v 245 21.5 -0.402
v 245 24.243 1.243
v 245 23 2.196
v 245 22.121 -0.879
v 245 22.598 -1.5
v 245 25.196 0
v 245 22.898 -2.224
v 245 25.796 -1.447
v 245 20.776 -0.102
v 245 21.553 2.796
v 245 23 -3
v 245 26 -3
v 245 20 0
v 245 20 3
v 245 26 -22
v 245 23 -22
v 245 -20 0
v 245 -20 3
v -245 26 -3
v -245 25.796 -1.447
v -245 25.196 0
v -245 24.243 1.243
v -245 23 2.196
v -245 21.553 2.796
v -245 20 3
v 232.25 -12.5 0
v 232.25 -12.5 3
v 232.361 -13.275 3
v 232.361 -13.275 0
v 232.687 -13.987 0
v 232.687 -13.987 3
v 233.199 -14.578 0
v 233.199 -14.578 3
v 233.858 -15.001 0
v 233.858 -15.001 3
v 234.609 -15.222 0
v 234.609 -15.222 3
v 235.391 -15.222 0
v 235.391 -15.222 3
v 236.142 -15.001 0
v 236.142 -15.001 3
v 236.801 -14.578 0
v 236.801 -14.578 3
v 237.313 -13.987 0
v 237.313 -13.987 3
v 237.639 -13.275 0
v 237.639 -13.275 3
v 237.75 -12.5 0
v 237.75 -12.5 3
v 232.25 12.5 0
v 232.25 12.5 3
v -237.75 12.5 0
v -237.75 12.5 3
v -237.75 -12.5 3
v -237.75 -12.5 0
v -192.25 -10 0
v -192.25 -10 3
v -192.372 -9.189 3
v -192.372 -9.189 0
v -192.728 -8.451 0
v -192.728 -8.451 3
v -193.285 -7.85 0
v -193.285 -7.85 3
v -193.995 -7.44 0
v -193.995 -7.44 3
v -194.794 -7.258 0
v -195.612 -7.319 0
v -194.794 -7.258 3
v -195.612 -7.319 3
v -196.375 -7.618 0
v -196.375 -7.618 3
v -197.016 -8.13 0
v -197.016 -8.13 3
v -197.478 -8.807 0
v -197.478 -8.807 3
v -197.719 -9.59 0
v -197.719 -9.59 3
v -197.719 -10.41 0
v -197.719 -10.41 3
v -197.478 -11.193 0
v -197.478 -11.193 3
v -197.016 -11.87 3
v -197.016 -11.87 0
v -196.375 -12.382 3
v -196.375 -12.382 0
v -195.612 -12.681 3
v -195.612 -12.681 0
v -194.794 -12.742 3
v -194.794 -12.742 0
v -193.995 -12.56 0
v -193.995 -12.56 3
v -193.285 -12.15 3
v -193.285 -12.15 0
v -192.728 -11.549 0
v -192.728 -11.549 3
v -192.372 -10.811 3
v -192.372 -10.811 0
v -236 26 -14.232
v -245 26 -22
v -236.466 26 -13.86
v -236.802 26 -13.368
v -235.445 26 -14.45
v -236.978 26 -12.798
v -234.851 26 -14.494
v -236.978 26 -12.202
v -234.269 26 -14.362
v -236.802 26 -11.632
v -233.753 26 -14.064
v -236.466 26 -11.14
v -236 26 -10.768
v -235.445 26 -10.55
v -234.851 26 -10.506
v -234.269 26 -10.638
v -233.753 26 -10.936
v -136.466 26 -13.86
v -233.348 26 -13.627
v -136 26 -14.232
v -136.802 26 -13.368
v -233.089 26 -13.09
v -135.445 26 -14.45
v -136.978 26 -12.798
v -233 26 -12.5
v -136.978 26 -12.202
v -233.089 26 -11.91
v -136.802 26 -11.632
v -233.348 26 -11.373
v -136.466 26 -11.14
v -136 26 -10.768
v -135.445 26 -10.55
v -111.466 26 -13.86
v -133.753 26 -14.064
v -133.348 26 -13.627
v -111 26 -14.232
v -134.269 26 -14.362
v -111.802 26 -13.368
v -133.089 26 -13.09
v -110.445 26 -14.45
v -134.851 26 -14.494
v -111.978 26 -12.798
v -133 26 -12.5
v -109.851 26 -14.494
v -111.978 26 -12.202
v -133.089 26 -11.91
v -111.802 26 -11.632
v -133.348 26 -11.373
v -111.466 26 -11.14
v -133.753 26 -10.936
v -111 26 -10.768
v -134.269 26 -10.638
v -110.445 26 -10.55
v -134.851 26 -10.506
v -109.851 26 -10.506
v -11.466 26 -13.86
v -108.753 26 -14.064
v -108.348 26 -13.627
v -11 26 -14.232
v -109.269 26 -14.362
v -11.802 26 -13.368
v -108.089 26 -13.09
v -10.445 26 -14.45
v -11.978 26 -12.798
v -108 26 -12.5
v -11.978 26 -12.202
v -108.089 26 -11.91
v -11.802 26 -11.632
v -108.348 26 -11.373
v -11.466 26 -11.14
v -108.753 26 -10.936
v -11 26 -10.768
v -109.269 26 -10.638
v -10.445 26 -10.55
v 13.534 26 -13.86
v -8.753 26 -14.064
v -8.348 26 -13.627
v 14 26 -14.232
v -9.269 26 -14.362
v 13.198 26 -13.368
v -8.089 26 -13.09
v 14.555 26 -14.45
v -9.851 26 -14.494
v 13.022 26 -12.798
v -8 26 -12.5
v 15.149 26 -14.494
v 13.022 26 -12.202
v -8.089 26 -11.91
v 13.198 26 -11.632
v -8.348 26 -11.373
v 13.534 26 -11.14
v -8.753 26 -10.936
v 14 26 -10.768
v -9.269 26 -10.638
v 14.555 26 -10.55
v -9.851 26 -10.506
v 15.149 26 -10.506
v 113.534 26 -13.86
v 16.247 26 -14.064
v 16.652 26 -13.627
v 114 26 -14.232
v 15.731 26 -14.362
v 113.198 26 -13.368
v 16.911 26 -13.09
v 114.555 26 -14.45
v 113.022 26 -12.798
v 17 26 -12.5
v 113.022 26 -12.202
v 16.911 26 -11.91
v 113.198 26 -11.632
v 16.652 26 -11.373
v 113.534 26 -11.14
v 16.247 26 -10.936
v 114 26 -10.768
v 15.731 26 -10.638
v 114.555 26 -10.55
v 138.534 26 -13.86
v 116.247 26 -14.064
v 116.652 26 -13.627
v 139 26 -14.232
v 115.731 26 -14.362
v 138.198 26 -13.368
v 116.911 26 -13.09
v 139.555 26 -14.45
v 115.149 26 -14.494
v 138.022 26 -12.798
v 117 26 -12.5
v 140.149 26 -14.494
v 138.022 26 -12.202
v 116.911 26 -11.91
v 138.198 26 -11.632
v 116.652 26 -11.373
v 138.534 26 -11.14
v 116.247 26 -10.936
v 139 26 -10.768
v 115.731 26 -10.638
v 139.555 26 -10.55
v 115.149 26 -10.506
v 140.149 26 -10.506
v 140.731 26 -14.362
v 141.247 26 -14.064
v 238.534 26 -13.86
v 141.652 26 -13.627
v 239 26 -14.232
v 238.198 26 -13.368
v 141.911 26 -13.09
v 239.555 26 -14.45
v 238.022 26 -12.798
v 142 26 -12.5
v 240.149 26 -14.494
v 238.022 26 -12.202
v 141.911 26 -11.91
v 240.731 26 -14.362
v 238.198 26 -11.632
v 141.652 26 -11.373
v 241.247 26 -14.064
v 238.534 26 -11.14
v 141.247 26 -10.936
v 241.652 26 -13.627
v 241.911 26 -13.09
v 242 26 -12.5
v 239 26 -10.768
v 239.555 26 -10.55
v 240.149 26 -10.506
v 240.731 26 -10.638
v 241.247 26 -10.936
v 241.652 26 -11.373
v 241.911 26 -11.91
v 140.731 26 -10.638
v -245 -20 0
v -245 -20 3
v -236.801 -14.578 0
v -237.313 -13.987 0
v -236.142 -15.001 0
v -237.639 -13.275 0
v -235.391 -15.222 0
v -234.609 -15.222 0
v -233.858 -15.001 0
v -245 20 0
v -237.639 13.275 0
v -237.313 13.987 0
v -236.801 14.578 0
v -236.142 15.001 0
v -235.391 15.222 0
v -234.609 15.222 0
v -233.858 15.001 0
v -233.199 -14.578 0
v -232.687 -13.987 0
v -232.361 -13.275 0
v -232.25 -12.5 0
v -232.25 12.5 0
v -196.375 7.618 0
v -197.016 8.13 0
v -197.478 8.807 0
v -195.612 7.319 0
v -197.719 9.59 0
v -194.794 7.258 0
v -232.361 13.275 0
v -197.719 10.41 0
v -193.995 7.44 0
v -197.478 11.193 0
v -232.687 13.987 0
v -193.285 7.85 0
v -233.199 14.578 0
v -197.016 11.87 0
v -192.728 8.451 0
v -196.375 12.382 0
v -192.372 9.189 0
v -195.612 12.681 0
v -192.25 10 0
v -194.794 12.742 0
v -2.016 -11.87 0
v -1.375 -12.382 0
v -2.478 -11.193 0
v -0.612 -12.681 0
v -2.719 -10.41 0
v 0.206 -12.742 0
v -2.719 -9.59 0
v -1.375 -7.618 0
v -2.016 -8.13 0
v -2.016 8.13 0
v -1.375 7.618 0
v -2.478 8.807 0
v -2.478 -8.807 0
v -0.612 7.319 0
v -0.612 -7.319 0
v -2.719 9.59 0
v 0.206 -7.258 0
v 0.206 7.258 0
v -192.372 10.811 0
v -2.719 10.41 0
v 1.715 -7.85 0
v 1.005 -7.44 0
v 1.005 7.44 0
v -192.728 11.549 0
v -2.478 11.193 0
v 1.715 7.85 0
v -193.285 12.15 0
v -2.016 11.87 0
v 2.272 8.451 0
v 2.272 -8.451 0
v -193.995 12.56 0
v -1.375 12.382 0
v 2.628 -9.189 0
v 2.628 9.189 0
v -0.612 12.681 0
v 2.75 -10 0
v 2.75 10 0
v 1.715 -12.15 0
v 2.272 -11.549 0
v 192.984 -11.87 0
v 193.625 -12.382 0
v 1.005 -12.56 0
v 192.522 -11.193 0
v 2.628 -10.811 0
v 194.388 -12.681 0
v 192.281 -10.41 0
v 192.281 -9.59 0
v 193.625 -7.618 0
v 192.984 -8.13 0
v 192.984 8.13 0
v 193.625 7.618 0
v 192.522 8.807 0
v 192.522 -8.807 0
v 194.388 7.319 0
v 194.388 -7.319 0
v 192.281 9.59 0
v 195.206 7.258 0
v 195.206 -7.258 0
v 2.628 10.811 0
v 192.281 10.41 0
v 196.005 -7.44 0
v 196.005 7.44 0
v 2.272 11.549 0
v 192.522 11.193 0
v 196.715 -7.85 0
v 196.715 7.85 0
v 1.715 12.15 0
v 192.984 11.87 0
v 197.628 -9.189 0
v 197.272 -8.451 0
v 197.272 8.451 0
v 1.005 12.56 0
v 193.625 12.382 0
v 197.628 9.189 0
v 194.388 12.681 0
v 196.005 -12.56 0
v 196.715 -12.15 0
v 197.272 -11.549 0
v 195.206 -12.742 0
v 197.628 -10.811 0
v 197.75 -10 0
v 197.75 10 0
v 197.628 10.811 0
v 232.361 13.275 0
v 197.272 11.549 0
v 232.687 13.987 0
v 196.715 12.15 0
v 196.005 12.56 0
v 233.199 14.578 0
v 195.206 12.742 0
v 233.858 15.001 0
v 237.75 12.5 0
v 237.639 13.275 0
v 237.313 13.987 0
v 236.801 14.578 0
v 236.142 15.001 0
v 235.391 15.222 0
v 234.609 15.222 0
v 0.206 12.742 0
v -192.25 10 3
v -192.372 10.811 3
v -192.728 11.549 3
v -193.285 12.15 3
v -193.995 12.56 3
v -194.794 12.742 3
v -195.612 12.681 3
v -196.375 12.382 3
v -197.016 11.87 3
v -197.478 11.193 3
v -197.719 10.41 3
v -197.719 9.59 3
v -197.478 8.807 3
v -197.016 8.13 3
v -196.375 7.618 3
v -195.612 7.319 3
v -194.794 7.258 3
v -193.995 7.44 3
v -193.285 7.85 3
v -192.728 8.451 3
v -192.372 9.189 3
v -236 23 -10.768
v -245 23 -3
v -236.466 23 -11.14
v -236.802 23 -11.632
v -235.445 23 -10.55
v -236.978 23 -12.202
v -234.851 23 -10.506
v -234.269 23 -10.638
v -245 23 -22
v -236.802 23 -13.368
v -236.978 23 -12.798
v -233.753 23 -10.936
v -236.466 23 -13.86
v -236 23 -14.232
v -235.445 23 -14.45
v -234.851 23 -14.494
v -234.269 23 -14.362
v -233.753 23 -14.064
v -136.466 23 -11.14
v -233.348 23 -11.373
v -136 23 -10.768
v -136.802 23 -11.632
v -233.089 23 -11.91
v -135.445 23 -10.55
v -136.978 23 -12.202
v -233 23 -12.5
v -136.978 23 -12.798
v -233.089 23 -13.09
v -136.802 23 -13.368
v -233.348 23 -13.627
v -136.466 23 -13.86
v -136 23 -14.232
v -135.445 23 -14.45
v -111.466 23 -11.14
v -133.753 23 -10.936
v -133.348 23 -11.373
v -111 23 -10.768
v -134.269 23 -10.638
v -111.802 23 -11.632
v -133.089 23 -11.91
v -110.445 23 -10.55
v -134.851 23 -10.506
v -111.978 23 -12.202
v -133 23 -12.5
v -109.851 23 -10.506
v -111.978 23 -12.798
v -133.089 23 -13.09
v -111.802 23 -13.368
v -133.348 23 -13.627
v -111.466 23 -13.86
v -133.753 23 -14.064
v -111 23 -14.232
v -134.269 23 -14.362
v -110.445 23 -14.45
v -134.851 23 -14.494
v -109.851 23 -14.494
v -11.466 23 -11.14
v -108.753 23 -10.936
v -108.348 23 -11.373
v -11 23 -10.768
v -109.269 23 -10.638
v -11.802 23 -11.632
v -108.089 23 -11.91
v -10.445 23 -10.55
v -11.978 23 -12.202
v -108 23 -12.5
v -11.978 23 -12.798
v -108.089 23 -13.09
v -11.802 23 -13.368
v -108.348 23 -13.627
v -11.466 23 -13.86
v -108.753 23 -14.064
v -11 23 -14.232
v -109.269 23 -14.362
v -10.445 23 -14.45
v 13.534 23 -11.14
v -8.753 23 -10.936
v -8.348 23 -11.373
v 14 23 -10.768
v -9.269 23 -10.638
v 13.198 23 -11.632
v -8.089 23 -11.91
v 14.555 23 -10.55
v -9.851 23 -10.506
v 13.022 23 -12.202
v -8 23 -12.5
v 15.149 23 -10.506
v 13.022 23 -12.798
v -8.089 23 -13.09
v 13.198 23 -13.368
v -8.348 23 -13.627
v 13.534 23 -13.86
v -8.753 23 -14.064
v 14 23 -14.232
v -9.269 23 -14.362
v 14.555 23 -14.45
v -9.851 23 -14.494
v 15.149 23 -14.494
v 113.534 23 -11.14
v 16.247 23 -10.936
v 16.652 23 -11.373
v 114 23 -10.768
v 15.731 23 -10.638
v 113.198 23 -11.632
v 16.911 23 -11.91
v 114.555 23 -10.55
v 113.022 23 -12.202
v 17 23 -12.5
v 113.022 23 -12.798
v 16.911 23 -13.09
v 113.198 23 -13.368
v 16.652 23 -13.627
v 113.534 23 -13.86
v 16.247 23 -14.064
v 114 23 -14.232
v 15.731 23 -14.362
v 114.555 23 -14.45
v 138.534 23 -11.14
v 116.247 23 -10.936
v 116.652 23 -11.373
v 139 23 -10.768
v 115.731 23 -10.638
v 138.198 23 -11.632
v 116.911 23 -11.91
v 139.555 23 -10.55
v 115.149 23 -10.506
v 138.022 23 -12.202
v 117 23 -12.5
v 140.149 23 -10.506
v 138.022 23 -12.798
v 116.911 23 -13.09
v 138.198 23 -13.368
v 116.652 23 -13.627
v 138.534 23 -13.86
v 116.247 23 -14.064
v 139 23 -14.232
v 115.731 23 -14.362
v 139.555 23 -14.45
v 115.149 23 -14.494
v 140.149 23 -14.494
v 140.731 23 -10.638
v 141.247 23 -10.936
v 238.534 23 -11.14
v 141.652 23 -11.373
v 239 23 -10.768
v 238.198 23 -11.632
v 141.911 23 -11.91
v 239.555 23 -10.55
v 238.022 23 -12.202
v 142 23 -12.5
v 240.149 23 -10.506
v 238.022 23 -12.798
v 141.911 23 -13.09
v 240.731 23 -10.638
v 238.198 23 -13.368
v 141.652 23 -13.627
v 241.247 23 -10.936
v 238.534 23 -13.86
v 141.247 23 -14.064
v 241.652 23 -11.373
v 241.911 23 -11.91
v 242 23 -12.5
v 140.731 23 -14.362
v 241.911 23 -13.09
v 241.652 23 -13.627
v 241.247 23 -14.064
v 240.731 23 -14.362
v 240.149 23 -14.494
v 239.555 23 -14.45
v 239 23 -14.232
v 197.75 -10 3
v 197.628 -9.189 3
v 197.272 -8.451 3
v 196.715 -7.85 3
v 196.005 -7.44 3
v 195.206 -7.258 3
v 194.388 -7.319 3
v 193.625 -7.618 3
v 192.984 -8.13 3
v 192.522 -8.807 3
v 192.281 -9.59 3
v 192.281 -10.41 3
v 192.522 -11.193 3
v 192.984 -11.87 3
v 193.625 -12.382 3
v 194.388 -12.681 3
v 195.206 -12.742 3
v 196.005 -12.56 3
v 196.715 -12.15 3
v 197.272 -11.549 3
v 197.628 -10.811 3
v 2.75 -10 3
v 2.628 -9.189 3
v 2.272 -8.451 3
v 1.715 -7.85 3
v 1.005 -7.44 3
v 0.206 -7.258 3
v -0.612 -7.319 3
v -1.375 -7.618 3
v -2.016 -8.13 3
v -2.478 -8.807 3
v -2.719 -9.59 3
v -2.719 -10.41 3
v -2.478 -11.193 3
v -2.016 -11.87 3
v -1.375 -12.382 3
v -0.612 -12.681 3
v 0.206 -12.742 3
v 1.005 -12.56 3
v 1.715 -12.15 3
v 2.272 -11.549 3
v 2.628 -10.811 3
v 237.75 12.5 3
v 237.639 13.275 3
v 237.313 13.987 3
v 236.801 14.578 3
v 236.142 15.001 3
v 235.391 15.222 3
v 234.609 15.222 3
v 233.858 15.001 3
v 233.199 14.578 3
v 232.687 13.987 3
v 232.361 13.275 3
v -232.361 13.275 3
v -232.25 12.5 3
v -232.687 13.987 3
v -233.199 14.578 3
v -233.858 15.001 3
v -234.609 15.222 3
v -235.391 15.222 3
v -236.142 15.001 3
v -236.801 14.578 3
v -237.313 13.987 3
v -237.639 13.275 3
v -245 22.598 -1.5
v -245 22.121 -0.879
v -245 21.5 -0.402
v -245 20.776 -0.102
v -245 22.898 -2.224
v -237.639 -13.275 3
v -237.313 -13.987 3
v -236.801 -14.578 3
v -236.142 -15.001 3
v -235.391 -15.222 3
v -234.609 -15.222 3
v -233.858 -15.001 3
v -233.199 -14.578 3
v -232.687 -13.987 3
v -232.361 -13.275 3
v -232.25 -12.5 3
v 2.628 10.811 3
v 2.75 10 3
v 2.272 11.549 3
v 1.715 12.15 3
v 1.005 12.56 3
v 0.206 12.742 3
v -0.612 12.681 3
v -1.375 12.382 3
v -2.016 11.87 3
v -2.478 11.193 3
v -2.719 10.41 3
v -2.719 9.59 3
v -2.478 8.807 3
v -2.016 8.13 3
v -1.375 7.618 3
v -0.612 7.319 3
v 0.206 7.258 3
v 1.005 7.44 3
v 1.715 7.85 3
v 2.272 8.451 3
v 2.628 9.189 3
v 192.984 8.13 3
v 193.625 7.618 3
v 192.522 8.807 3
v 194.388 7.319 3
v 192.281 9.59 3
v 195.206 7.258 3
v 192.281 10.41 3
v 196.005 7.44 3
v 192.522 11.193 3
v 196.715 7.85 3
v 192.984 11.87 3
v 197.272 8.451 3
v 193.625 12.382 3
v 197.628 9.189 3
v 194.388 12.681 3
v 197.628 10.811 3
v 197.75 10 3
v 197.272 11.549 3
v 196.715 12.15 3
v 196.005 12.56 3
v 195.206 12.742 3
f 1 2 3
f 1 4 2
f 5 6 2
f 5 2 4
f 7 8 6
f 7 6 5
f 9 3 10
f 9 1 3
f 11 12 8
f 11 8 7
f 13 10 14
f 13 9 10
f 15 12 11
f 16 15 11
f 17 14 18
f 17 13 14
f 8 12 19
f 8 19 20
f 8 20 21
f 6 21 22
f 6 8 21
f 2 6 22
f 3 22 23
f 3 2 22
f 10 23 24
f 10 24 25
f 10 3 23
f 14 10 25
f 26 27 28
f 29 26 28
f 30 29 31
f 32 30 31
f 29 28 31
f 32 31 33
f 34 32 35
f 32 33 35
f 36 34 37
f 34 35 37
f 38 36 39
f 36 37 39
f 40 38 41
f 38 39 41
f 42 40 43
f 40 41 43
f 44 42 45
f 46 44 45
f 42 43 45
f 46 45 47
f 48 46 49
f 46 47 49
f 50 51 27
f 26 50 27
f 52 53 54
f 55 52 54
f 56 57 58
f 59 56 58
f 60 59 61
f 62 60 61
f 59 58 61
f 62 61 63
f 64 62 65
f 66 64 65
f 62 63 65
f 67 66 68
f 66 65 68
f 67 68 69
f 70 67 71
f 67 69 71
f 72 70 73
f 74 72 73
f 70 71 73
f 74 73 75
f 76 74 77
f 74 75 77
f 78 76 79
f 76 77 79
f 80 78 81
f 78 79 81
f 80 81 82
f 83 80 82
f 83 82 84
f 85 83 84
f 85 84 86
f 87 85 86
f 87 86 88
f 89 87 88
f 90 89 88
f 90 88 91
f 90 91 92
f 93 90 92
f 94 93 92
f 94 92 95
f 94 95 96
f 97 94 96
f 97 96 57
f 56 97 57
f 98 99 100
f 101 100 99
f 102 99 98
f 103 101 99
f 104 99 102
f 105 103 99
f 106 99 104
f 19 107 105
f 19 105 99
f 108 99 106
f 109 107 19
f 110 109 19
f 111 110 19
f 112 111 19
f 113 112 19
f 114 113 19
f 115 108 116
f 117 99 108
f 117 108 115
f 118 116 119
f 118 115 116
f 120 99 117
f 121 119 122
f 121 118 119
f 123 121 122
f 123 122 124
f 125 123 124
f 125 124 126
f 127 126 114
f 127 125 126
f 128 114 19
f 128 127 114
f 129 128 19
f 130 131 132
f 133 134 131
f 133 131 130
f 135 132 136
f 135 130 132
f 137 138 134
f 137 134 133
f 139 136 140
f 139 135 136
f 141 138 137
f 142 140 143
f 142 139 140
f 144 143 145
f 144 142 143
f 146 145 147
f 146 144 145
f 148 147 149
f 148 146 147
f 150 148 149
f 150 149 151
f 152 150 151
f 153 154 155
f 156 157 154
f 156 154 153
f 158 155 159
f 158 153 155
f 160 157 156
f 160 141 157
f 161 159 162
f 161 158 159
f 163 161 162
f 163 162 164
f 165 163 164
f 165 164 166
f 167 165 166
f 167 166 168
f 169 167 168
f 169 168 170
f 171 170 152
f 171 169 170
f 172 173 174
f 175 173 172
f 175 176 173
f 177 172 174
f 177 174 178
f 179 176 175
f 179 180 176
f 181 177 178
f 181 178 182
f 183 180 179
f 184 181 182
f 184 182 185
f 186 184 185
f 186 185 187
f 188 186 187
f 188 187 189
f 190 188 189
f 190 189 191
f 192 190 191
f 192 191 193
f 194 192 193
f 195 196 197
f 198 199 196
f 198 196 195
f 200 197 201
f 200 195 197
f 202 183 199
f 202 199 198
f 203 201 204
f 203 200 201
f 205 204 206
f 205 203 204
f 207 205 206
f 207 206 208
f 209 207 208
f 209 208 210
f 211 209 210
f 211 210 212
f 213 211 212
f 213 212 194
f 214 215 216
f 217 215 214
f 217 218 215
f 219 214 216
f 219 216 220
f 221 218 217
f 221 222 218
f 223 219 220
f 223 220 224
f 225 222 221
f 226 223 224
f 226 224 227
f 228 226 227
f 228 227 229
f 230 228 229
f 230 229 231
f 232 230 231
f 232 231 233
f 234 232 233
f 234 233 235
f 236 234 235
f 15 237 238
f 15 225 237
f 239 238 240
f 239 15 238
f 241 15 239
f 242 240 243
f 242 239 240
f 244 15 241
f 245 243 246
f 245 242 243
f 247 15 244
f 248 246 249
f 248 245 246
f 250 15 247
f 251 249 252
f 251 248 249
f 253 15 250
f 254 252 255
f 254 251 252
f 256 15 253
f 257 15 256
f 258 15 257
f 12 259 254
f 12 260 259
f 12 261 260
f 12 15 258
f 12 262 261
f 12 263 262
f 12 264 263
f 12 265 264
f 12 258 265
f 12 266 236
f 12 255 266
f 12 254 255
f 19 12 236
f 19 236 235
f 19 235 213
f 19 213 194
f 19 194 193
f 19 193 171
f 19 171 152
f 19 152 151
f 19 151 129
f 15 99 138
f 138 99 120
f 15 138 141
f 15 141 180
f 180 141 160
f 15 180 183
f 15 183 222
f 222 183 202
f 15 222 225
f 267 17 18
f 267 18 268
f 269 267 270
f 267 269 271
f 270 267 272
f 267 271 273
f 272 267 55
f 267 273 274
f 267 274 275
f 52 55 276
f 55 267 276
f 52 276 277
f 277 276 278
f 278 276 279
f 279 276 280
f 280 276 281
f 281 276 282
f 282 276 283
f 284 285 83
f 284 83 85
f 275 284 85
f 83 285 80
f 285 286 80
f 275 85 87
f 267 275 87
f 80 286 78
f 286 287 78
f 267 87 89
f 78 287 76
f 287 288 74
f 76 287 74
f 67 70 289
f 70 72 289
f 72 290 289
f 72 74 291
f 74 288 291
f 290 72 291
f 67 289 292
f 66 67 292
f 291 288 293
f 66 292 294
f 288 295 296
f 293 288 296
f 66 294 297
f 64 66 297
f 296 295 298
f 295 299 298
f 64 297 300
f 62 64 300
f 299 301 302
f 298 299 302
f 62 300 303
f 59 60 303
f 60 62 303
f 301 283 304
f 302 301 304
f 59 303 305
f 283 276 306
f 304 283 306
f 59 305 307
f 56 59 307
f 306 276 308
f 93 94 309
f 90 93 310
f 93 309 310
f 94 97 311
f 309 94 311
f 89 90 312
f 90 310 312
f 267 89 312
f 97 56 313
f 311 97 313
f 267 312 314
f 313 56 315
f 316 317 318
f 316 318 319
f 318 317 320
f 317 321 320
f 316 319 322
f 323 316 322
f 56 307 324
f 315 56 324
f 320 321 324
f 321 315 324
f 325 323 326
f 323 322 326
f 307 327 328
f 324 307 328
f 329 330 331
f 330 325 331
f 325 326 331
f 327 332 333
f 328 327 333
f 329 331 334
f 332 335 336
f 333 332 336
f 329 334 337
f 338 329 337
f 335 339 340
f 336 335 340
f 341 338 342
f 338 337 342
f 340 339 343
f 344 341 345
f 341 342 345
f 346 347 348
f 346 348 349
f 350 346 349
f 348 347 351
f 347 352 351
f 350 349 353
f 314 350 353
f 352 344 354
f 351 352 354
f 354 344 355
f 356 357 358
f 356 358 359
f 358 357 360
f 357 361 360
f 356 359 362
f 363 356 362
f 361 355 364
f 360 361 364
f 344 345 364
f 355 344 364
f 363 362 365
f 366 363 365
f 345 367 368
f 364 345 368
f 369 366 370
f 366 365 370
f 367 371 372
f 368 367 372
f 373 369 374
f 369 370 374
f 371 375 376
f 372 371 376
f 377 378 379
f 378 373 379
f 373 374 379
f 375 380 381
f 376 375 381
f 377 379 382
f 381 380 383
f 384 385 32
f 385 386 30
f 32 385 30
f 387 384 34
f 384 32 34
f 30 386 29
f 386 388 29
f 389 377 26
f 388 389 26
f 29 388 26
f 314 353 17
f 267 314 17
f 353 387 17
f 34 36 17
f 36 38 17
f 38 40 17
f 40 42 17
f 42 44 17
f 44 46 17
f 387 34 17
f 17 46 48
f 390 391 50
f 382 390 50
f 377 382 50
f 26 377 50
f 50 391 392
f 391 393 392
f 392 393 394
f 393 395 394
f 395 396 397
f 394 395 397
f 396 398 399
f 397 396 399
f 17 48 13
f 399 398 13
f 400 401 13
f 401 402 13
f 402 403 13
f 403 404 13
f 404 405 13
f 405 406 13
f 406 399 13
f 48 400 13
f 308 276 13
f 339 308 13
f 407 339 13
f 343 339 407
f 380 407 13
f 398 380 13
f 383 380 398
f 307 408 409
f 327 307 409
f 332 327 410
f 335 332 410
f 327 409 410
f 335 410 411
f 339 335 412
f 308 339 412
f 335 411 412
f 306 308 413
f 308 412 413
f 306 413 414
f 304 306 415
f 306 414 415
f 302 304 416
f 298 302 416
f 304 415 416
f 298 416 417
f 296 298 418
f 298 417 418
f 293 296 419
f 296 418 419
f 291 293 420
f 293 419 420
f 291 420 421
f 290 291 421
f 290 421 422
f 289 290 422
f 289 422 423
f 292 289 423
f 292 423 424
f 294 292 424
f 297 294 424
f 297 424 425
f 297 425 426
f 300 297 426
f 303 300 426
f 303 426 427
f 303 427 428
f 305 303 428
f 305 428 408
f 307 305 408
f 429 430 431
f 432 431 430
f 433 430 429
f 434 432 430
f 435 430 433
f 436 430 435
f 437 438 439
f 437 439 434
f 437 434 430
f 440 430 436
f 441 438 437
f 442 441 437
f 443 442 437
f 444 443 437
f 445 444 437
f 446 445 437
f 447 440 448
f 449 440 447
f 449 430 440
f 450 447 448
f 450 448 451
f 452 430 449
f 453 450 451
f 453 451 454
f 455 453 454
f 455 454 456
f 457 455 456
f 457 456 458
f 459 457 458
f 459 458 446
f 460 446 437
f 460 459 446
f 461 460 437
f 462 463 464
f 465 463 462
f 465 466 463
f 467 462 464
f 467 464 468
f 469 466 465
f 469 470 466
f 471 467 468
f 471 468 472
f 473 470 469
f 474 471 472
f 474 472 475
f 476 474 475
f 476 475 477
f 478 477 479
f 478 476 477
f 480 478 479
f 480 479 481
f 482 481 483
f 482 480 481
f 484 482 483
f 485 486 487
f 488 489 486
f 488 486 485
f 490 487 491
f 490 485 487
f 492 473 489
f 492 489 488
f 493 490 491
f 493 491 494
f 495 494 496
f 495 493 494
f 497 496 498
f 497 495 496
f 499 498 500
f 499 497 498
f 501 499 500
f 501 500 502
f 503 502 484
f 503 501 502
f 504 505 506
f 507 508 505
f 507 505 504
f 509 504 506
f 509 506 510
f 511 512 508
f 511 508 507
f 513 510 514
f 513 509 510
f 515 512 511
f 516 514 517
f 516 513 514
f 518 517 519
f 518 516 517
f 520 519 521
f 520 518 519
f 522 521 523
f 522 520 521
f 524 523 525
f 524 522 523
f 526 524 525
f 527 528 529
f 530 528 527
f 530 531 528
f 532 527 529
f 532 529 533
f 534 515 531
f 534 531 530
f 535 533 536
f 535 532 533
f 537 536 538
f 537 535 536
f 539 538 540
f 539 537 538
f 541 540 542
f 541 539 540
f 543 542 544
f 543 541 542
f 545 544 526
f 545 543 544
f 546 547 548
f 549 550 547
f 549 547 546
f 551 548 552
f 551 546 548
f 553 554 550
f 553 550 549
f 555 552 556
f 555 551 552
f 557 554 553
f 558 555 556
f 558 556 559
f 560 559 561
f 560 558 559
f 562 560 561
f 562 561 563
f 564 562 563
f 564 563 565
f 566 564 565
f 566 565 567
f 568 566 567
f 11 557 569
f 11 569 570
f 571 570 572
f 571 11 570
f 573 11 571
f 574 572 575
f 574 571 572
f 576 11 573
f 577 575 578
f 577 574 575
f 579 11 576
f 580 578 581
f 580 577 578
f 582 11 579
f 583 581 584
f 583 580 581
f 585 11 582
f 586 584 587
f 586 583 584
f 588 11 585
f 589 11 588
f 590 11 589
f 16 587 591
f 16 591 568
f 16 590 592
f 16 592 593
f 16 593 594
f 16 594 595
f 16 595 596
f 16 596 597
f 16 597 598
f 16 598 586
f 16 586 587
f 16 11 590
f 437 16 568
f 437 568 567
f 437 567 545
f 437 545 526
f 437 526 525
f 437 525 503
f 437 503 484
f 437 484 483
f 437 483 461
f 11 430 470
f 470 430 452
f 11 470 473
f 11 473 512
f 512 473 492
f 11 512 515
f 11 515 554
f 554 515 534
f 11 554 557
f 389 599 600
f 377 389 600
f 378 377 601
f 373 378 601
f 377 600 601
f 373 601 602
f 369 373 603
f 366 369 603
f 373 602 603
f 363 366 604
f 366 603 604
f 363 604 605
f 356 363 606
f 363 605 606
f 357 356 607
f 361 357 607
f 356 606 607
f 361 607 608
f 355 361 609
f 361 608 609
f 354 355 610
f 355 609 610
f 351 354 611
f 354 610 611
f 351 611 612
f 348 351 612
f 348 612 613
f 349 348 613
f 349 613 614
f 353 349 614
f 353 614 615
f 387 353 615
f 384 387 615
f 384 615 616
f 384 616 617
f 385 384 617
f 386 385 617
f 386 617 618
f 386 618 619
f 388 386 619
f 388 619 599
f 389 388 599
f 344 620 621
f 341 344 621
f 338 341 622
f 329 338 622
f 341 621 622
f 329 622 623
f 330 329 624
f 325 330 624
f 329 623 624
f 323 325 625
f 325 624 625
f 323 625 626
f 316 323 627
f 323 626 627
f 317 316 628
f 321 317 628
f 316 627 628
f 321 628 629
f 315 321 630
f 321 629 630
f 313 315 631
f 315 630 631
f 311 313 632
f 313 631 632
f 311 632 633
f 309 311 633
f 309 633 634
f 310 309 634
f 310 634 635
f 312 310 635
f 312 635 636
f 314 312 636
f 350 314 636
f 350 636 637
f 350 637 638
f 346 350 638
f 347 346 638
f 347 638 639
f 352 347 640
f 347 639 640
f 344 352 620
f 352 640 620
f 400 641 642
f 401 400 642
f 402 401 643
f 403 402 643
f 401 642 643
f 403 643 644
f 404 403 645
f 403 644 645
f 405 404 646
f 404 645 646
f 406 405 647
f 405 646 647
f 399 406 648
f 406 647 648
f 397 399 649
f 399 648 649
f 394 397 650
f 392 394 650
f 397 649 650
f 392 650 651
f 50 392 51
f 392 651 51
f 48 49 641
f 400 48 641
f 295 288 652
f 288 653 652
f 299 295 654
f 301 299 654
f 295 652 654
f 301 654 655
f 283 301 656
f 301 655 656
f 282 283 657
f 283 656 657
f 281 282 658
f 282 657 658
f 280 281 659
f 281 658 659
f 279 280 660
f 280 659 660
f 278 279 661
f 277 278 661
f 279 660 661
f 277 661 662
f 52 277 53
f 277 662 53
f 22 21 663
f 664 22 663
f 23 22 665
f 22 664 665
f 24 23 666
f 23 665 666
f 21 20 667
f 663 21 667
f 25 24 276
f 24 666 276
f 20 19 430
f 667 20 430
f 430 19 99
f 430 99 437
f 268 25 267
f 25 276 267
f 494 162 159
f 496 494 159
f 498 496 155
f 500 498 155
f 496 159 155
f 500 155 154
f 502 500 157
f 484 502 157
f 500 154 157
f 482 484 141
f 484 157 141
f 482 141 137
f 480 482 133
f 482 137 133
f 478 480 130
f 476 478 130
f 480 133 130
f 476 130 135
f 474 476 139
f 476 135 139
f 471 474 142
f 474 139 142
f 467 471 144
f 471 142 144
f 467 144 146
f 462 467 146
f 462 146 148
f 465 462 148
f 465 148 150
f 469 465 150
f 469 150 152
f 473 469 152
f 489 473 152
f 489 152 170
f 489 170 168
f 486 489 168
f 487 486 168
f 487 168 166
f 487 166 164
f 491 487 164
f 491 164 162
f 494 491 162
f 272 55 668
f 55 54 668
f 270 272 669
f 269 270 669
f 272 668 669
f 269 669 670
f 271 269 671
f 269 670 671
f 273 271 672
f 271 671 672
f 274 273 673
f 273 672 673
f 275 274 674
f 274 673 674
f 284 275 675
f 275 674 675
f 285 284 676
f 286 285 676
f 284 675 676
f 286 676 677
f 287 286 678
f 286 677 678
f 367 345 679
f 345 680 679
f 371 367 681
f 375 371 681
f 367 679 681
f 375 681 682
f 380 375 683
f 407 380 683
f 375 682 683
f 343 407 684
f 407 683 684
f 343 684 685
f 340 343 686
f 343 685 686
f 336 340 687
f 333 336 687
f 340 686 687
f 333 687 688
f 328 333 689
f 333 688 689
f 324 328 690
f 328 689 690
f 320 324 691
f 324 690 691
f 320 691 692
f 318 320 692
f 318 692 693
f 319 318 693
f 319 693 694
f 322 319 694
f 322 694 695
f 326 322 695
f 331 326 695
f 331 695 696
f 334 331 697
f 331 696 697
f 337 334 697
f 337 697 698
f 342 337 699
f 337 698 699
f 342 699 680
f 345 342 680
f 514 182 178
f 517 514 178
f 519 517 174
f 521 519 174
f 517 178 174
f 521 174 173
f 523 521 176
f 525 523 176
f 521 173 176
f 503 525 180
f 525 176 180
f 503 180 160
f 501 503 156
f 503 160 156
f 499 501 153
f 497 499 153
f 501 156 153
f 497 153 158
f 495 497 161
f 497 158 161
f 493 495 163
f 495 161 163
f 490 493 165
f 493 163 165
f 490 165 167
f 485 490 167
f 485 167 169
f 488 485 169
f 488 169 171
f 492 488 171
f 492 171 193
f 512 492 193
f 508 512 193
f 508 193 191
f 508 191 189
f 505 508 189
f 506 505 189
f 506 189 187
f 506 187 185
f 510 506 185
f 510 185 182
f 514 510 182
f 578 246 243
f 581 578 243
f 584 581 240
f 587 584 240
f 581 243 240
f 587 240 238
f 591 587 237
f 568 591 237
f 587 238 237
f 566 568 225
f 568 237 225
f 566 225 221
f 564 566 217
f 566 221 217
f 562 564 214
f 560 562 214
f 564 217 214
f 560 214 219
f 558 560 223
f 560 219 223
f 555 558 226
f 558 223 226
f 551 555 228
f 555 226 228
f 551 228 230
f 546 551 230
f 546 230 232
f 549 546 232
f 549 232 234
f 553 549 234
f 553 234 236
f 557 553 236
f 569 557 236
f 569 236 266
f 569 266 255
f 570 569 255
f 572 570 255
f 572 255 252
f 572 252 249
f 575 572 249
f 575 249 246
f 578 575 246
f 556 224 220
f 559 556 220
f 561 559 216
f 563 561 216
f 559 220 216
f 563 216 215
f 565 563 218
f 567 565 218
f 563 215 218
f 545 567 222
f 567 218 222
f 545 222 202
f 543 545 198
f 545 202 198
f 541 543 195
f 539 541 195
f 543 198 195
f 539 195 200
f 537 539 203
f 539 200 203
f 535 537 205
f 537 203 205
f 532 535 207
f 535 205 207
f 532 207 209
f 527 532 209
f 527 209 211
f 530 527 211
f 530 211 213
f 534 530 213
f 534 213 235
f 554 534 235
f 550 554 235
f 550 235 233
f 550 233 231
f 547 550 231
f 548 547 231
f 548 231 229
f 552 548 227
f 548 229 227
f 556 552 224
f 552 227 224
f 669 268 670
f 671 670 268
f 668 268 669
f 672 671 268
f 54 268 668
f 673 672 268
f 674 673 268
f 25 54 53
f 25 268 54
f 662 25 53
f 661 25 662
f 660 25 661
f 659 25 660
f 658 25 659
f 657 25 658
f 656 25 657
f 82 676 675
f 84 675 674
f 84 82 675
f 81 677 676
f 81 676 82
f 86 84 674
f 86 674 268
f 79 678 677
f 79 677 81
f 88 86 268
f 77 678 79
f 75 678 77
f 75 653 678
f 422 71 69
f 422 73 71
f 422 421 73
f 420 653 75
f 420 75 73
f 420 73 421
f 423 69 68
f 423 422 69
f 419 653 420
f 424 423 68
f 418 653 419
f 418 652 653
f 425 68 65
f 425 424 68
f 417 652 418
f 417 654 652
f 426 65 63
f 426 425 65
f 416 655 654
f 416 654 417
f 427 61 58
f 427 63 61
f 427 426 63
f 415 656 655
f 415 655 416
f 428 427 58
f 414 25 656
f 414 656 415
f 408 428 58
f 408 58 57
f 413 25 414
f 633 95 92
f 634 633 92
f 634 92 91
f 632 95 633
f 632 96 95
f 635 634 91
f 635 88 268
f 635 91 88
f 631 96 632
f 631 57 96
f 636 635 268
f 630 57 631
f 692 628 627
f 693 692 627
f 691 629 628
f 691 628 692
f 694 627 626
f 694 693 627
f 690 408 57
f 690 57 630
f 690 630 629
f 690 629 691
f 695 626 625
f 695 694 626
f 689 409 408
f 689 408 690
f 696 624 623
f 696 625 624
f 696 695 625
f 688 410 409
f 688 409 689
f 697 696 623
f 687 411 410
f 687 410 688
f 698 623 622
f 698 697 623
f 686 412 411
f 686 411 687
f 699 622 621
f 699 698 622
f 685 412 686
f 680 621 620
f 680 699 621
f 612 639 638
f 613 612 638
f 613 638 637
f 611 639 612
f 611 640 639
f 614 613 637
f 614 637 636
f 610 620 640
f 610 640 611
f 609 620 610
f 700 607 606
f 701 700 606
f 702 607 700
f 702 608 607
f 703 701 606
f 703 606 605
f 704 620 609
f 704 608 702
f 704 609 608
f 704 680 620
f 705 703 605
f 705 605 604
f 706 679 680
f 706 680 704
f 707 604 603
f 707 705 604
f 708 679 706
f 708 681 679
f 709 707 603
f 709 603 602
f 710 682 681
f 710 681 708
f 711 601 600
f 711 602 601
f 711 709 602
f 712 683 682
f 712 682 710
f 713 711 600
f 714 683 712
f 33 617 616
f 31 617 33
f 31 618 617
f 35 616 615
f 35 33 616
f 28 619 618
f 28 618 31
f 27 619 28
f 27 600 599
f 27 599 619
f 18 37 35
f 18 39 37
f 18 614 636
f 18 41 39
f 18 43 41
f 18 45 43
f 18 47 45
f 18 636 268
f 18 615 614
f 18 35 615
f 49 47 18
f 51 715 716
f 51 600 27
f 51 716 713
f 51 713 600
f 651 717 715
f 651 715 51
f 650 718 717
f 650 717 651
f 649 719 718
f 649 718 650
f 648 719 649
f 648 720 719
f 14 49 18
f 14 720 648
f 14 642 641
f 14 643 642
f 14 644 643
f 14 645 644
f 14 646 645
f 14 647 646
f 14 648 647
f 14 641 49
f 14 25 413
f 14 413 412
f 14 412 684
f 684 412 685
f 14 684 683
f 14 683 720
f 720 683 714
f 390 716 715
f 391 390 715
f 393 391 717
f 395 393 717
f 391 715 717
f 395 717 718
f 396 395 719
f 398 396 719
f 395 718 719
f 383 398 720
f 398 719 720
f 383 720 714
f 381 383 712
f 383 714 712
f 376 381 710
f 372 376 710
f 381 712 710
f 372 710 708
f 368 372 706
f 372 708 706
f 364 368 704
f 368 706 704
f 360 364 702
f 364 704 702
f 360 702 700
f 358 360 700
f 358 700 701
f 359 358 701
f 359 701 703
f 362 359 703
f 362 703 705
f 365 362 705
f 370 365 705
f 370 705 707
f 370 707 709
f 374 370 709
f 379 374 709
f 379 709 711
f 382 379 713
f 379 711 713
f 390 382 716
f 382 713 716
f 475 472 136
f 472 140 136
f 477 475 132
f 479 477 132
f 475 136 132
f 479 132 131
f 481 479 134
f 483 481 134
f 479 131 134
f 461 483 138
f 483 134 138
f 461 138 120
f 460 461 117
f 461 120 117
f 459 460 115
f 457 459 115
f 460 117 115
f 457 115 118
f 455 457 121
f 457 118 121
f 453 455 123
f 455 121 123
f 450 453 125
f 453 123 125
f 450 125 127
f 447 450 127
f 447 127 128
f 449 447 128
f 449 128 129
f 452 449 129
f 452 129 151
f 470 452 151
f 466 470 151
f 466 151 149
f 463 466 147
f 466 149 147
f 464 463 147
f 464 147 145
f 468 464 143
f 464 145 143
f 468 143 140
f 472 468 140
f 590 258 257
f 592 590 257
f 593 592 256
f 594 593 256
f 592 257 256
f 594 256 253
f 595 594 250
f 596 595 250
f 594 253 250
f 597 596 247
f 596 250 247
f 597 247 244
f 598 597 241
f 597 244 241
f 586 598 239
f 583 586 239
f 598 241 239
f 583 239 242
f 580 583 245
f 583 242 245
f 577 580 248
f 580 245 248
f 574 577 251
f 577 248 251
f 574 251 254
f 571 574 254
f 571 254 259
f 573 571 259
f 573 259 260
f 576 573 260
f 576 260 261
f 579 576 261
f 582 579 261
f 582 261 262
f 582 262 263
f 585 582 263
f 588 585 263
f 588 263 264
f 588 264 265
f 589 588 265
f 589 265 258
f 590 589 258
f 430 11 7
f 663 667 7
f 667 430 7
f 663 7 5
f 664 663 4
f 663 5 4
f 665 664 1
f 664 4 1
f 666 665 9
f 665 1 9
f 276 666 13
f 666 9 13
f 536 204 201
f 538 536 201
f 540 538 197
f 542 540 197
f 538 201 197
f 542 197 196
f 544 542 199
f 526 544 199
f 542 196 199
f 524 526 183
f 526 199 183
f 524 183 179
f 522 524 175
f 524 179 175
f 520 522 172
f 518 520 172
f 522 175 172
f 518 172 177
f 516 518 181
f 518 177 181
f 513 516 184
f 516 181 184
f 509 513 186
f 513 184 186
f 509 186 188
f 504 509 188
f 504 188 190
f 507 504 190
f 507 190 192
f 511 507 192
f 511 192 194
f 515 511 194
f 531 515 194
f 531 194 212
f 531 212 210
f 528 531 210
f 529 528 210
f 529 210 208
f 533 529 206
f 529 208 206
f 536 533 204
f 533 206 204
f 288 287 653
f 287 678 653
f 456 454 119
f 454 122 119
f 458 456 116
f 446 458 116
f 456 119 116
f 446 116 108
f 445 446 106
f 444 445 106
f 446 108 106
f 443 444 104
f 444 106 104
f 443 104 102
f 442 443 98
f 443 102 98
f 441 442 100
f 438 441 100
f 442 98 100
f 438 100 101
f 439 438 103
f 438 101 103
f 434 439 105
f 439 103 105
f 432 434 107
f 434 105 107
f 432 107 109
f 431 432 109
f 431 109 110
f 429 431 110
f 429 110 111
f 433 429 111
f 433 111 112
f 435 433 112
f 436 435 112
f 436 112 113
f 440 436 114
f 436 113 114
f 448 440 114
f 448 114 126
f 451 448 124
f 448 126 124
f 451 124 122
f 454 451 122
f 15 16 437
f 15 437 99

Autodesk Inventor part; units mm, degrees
ref_plane "YZ Plane" through (0, 0, 0) normal (1, 0, 0) x (0, 1, 0)
ref_plane "XZ Plane" through (0, 0, 0) normal (0, 1, 0) x (-1, 0, 0)
ref_plane "XY Plane" through (0, 0, 0) normal (0, 0, 1) x (1, 0, 0)
sketch "Sketch1" plane through (0, 0, 0) normal (0, 0, 1) x (1, 0, 0)
  line L0 (-245, 20) -> (245, 20)
  line L1 (245, 20) -> (245, -20)
  line L2 (245, -20) -> (-245, -20)
  line L3 (-245, -20) -> (-245, 20)
  point P0 (0, 0)
  dimension "d0" = 490
  dimension "d1" = 40
  dimension "d2" = 20
  dimension "d3" = 245
extrude "Plate1" add sketch "Sketch1" along normal blind 3
sketch "Sketch2" plane through (0, 0, 3) normal (0, 0, 1) x (1, 0, 0)
  line L0 (-245, 20) -> (245, 20) projected
  line L1 (-245, -20) -> (-245, 20) projected
  arc A0 (-232.25, 12.5) -> (-237.75, 12.5) centre (-235, 12.5) ccw
  arc A1 (-237.75, -12.5) -> (-232.25, -12.5) centre (-235, -12.5) ccw
  line L2 (-237.75, 12.5) -> (-237.75, -12.5)
  line L3 (-232.25, -12.5) -> (-232.25, 12.5)
  point P0 (0, 0)
  dimension "d5" = 5.5
  dimension "d6" = 5.5
  dimension "d8" = 10
  dimension "d9" = 10
  dimension "d11" = 7.5
  dimension "d27" = 25
  dimension "d28" = 25
extrude "Extrusion1" cut sketch "Sketch2" against normal blind 10
pattern_linear "Rectangular Pattern1" count 2 spacing 470 along (1, 0, 0) of "Extrusion1"
sketch "Sketch3" plane through (245, 23, -3) normal (0, 1, 0) x (-1, 0, 0)
  line L0 (490, 0) -> (0, 0)
  line L1 (0, 0) -> (0, -19)
  line L2 (0, -19) -> (490, -19)
  line L3 (490, -19) -> (490, 0)
edge flange "Flange1" height 25 angle 90 thickness 3 bend radius 3 thickness toward (0, 1, 0) relief tear relief width 3 relief depth 1.5 edges at (0, 20, 0) wall of the first edge with corners at (-245, 23, -3) (245, 23, -3) (245, 23, -22) (-245, 23, -22)
bend "Bend1"
corner "Corner1"
sketch "Sketch4" plane through (-245, 26, -22) normal (0, 1, 0) x (1, 0, 0)
  line L0 (0, 0) -> (490, 0) projected
  line L1 (0, -19) -> (0, 0) projected
  circle A0 centre (10, -9.5) radius 2
  circle A1 centre (110, -9.5) radius 2
  point P0 (245, -22)
  dimension "d29" = 4
  dimension "d30" = 9.5
  dimension "d31" = 10
  dimension "d32" = 4
  dimension "d33" = 110
  dimension "d34" = 9.5
extrude "Extrusion2" cut sketch "Sketch4" against normal through all
pattern_linear "Rectangular Pattern2" count 4 spacing 125 along (1, 0, 0) of "Extrusion2"
sketch "Sketch5" plane through (0, 0, 3) normal (0, 0, 1) x (1, 0, 0)
  line L0 (-245, 20) -> (245, 20) projected
  line L1 (-245, -20) -> (-245, 20) projected
  circle A0 centre (-195, 10) radius 2.75
  circle A1 centre (-195, -10) radius 2.75
  point P0 (0, 0)
  dimension "d40" = 5.5
  dimension "d41" = 5.5
  dimension "d42" = 20
  dimension "d43" = 10
  dimension "d44" = 50
  dimension "d45" = 50
extrude "Extrusion3" cut sketch "Sketch5" against normal through all
pattern_linear "Rectangular Pattern3" count 3 spacing 195 along (1, 0, 0) of "Extrusion3"
equation "\"d17\" = BendReliefWidth"
equation "\"d18\" = BendReliefDepth"
equation "\"d19\" = MinimumRemnant"
equation "\"d20\" = BendRadius"
equation "\"d23\" = BendRadius"
equation "\"d24\" = CornerReliefSize"
equation "\"d25\" = GapSize"
equation "\"d26\" = JacobiRadiusSize"
equation "\"d2\" = 0.5 * d1"
equation "\"d3\" = 0.5 * d0"
equation "\"BendRadius\" = Thickness"
equation "\"BendReliefWidth\" = Thickness"
equation "\"BendReliefDepth\" = 0.5 * Thickness"
equation "\"CornerReliefSize\" = 4 * Thickness"
equation "\"MinimumRemnant\" = 2 * Thickness"
equation "\"TransitionRadius\" = BendRadius"
equation "\"JacobiRadiusSize\" = BendRadius"
equation "\"GapSize\" = Thickness"
equation "\"d4\" = BendRadius"
equation "\"Thickness\" = 3"
properties part number "formed_right_left" material "Steel, Mild"
